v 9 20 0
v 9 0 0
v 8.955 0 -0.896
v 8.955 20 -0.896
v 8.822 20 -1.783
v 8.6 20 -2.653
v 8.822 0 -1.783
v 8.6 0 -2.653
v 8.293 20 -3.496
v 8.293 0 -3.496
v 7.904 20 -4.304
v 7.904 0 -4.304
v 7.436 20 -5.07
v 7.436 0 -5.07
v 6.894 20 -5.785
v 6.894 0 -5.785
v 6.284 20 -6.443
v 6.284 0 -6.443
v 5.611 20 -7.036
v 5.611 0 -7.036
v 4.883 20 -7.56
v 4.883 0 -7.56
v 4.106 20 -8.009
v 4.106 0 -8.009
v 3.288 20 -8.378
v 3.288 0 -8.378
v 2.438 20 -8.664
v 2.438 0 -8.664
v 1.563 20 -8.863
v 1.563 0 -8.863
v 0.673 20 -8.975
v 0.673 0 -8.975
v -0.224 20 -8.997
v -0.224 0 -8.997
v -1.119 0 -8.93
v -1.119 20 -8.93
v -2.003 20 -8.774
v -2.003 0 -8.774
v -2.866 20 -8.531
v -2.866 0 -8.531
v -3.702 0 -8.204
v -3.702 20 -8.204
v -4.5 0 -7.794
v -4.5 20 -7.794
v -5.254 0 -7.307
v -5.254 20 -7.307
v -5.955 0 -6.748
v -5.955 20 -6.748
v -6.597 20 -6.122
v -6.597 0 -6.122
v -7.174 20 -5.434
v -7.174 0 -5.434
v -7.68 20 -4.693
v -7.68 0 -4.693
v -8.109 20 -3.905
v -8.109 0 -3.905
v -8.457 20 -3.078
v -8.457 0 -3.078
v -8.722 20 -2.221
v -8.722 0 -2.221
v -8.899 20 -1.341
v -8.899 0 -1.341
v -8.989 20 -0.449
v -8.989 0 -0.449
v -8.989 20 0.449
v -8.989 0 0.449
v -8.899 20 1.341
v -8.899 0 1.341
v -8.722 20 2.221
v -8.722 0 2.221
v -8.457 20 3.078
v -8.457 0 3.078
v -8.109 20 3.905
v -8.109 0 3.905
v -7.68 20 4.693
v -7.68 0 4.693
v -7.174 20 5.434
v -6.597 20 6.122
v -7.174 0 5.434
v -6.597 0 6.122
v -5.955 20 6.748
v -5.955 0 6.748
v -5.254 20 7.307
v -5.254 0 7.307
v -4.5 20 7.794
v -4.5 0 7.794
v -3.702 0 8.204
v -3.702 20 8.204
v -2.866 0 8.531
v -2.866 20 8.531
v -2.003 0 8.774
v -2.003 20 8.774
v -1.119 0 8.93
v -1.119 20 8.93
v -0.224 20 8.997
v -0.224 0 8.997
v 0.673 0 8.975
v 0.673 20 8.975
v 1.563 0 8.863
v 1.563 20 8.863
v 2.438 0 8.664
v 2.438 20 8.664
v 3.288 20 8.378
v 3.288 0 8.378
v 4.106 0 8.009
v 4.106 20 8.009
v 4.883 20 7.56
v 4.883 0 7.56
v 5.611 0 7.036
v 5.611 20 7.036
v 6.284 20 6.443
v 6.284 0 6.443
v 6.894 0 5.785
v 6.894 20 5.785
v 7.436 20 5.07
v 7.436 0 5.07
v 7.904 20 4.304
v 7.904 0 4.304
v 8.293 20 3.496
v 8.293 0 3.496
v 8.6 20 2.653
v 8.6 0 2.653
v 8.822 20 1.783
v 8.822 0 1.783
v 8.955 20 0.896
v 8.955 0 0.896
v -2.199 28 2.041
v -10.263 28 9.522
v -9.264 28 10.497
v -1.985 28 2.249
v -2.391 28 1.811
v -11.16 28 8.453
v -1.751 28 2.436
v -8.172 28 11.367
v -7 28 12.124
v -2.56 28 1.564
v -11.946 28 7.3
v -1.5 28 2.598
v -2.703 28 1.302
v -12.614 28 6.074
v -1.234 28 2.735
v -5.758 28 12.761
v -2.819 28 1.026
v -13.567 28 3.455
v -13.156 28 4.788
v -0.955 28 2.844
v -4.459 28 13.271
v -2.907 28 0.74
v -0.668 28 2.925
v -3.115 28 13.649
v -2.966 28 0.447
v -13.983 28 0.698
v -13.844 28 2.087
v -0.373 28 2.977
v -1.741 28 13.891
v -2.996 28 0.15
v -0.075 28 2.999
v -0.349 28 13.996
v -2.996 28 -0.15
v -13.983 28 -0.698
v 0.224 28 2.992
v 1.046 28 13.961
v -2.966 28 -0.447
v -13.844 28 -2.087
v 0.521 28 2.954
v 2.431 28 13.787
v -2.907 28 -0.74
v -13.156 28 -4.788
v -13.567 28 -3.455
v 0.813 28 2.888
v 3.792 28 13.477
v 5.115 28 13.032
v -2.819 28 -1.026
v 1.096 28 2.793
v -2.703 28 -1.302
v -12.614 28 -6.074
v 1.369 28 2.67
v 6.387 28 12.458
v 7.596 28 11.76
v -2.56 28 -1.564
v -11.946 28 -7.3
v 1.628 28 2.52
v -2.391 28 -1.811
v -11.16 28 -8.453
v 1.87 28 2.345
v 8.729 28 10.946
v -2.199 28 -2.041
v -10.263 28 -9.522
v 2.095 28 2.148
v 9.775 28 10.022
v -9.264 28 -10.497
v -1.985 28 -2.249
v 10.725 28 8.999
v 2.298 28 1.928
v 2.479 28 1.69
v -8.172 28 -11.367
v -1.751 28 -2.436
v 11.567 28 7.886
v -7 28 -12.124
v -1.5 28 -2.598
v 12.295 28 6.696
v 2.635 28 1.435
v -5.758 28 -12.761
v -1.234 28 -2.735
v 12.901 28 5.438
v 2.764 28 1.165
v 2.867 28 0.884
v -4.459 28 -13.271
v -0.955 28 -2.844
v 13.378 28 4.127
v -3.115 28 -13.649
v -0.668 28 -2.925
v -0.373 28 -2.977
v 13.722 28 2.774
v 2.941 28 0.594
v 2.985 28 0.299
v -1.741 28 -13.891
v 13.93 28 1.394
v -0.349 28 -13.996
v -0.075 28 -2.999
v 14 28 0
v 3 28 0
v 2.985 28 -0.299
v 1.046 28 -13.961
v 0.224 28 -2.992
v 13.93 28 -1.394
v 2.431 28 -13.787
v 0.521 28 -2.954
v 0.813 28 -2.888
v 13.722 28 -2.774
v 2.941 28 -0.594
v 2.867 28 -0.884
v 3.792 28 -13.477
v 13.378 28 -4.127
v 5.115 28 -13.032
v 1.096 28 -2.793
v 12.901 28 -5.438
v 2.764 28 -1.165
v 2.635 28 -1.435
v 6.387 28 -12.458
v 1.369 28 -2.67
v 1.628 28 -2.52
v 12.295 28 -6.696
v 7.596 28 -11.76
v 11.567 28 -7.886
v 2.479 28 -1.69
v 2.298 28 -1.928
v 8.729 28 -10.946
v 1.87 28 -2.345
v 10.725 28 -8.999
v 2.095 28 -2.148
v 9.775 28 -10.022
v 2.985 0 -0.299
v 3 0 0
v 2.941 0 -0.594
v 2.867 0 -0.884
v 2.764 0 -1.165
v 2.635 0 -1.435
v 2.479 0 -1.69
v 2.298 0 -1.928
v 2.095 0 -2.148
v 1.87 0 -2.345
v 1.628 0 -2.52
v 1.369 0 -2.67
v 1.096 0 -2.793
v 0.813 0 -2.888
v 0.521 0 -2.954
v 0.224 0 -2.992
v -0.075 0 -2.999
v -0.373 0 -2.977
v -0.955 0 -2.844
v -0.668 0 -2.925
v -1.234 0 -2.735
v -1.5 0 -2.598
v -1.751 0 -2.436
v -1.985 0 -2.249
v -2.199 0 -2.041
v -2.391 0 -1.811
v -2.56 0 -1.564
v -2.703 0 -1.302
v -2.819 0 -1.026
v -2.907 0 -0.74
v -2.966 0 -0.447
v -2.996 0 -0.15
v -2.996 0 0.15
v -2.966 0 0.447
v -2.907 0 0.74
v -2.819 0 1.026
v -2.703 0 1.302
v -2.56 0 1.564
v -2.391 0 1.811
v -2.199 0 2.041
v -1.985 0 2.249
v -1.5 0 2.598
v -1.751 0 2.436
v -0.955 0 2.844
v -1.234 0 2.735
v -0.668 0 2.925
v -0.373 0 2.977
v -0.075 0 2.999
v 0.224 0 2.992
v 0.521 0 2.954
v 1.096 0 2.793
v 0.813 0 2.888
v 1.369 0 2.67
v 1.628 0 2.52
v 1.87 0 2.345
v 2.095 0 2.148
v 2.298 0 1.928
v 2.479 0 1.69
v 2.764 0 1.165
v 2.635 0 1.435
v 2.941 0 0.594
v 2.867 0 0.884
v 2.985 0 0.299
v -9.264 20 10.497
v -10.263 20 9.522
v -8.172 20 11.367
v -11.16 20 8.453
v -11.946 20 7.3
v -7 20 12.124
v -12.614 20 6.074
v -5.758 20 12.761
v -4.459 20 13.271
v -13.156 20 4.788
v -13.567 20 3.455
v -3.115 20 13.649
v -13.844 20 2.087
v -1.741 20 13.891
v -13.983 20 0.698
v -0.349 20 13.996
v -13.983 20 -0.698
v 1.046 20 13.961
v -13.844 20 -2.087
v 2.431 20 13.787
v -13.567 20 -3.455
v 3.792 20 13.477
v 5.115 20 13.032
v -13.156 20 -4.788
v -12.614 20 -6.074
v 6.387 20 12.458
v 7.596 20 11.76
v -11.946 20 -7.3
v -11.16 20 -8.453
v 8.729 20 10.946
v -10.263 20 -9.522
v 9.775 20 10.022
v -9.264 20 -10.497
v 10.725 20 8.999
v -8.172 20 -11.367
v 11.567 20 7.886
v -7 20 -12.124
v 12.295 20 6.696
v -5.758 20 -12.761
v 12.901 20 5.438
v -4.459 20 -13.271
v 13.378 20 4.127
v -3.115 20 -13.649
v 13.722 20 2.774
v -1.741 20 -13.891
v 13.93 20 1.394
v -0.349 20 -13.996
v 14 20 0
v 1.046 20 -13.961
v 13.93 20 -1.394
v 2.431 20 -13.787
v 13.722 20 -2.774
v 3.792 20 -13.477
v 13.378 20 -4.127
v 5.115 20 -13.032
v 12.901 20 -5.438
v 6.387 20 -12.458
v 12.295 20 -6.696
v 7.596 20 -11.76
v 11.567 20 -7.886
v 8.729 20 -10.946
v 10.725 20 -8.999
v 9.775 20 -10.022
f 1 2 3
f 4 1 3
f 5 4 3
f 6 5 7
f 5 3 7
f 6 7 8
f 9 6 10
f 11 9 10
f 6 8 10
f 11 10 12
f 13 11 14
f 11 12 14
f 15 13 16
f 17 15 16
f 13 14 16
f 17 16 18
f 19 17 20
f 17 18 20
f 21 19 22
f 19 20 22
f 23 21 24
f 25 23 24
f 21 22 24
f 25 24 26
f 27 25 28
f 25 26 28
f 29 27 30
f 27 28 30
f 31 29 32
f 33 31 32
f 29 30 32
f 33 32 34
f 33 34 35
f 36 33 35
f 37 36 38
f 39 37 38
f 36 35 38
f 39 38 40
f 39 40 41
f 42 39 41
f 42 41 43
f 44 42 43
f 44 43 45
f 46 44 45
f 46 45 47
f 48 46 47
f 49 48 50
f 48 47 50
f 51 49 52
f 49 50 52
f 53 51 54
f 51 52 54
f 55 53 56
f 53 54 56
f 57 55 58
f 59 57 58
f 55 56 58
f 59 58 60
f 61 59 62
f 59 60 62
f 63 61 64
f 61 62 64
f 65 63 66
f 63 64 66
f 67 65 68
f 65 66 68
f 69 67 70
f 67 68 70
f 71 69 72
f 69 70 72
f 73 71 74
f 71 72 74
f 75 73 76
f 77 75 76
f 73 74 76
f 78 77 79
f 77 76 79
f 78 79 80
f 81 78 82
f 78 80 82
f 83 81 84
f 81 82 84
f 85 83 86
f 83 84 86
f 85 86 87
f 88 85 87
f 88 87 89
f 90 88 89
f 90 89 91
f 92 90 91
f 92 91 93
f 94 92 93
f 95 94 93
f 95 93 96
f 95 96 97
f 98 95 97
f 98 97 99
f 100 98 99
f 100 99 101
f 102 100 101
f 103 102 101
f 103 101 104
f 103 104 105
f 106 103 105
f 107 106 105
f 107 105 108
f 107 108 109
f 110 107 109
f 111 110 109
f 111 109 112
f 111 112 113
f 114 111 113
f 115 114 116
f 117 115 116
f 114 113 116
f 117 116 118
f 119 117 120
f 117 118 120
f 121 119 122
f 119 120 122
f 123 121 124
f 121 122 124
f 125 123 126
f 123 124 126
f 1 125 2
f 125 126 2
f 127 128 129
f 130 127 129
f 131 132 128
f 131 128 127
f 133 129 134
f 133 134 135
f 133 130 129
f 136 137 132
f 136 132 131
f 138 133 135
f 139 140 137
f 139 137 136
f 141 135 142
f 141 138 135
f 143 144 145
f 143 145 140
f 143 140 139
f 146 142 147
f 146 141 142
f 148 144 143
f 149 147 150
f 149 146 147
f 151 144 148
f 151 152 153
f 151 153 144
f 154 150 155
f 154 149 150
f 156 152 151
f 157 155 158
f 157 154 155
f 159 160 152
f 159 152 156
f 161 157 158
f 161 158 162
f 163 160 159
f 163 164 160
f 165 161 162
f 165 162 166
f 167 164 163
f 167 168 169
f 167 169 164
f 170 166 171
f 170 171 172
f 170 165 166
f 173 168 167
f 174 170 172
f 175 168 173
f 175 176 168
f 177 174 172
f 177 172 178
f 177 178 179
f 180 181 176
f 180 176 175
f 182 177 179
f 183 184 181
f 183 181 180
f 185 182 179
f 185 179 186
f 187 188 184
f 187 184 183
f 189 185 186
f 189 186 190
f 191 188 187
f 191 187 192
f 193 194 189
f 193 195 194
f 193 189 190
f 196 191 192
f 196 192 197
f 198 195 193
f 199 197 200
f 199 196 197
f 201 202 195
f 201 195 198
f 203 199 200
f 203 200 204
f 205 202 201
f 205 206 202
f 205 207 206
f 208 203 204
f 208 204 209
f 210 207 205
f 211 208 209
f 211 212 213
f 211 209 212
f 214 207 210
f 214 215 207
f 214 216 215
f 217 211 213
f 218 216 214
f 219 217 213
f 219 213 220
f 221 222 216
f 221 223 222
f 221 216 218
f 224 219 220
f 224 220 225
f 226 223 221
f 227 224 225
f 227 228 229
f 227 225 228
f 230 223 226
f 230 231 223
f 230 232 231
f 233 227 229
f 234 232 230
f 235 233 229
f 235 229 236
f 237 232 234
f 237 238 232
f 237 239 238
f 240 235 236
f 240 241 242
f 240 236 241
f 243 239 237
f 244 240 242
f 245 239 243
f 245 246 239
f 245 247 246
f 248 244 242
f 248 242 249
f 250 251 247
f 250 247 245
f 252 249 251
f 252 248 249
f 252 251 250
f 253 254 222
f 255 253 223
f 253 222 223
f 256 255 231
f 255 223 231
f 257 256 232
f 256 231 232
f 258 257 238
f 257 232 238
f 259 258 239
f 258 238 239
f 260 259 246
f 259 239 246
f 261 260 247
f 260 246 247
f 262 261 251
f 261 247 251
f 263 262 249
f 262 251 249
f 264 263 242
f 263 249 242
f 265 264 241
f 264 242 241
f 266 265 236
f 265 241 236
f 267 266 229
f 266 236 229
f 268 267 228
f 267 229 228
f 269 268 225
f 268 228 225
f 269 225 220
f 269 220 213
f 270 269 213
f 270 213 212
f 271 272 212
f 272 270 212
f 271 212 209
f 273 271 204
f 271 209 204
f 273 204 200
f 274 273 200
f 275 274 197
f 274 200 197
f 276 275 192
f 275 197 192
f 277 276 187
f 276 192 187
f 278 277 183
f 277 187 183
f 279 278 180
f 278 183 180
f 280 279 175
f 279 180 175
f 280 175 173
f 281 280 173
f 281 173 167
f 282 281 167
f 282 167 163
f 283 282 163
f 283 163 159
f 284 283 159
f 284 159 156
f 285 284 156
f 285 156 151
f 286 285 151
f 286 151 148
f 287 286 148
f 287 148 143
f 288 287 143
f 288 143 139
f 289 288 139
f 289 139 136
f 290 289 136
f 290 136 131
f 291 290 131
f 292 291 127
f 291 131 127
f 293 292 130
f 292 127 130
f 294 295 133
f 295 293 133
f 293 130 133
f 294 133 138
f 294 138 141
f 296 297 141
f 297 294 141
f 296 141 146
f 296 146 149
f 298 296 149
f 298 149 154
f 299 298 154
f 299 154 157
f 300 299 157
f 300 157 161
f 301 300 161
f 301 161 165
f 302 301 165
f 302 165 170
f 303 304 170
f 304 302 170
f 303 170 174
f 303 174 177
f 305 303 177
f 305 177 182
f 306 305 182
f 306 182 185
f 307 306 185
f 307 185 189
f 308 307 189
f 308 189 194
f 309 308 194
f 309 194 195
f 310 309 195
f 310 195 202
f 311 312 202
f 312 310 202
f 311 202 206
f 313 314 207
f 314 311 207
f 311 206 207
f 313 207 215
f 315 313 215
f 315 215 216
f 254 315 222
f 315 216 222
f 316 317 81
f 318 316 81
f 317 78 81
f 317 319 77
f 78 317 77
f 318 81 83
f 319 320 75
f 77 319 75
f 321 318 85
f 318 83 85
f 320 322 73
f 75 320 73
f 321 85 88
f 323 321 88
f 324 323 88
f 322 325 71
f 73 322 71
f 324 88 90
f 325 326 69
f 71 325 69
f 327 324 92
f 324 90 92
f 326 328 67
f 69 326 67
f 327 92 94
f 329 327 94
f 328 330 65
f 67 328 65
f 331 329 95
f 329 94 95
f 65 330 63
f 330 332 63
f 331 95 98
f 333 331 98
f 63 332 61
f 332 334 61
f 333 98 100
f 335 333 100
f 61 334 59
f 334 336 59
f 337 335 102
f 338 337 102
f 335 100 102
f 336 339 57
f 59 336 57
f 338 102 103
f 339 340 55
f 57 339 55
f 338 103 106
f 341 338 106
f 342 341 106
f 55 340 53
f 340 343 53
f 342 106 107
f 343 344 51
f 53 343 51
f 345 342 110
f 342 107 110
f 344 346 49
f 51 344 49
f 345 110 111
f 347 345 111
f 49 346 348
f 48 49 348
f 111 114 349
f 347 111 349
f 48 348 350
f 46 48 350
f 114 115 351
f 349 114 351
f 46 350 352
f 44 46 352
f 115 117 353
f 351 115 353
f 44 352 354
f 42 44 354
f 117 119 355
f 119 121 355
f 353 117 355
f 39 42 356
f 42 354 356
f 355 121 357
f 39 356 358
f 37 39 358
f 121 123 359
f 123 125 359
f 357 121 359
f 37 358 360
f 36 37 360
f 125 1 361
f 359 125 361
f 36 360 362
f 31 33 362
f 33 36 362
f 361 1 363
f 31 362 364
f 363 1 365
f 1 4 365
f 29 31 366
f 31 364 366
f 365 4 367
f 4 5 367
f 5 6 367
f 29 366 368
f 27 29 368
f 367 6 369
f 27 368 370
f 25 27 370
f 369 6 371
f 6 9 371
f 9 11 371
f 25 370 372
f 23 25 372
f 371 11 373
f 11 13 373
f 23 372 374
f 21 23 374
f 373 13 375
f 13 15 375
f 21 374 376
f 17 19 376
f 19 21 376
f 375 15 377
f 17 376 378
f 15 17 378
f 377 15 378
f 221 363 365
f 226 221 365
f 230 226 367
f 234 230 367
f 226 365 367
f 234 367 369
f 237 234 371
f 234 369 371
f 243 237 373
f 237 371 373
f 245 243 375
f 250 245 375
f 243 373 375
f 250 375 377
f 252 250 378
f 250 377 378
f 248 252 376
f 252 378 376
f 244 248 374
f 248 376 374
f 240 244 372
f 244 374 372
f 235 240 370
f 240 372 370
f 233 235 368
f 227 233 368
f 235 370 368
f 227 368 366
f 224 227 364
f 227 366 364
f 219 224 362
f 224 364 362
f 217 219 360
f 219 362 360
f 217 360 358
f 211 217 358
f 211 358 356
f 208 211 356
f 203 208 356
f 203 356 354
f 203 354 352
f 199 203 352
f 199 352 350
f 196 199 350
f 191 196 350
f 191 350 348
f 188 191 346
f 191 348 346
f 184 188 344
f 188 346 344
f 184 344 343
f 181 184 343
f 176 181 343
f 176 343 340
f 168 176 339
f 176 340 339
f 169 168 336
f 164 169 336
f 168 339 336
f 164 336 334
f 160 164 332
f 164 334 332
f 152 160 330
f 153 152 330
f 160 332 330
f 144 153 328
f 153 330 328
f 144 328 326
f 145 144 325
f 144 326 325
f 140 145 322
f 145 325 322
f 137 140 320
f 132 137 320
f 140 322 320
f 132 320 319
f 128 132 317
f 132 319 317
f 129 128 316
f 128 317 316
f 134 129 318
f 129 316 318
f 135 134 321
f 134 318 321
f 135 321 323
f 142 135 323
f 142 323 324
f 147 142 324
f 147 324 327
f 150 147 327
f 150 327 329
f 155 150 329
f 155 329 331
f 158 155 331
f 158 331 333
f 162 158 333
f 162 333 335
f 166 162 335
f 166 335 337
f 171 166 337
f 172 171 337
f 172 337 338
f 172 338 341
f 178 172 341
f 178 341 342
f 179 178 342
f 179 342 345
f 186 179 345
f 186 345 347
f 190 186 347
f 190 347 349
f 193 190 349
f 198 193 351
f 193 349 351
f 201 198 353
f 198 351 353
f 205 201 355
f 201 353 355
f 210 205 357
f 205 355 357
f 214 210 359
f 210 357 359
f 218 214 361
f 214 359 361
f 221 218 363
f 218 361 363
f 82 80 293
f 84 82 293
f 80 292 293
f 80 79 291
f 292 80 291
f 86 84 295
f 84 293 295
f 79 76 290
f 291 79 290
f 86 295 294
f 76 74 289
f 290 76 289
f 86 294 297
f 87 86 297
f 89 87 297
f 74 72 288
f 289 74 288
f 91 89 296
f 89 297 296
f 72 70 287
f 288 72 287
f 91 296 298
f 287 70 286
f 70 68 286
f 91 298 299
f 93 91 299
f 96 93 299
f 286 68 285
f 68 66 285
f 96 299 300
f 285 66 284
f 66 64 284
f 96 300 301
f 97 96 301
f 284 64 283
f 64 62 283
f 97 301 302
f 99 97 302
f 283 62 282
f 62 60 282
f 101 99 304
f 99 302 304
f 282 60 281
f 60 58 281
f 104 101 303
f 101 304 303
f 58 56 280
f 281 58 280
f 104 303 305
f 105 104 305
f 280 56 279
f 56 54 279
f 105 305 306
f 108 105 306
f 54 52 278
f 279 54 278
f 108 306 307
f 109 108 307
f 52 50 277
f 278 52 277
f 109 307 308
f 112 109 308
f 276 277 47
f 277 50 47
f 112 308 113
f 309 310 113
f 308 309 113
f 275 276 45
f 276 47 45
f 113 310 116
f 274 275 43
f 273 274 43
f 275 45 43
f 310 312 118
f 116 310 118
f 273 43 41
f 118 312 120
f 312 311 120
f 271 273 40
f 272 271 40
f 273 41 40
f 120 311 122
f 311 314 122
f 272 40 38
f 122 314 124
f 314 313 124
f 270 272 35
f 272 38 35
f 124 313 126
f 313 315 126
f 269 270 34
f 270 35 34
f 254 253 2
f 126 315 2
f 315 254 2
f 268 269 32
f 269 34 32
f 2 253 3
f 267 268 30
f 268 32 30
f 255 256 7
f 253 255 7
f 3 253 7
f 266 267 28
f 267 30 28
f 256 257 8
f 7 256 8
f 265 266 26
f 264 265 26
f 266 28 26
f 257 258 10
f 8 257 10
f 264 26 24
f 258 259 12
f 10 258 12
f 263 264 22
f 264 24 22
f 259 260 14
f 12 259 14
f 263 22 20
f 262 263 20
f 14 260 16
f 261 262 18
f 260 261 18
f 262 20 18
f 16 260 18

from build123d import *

# Parameters (mm, degrees)
SKETCH1_R           = 9
BOSS_EXTRUDE1_DEPTH = 20
SKETCH2_R           = 3
CUT_EXTRUDE1_DEPTH  = 52
SKETCH3_R           = 14
BOSS_EXTRUDE2_DEPTH = 8
SKETCH4_R           = 3
CUT_EXTRUDE2_DEPTH  = 12


with BuildPart() as part:
    # Sketch1 → Boss-Extrude1 (new body)
    with BuildSketch(Plane(origin=(0, 0, 0), x_dir=(1, 0, 0), z_dir=(0, 1, 0))):
        Circle(SKETCH1_R)
    extrude(amount=BOSS_EXTRUDE1_DEPTH)

    # Sketch2 → Cut-Extrude1 (cut)
    with BuildSketch(Plane.XZ):
        Circle(SKETCH2_R)
    extrude(amount=-CUT_EXTRUDE1_DEPTH, mode=Mode.SUBTRACT)

    # Sketch3 → Boss-Extrude2 (add)
    with BuildSketch(Plane(origin=(0, 20, 0), x_dir=(1, 0, 0), z_dir=(0, 1, 0))):
        Circle(SKETCH3_R)
    extrude(amount=BOSS_EXTRUDE2_DEPTH)

    # Sketch4 → Cut-Extrude2 (cut)
    with BuildSketch(Plane(origin=(0, 28, 0), x_dir=(1, 0, 0), z_dir=(0, 1, 0))):
        Circle(SKETCH4_R)
    extrude(amount=-CUT_EXTRUDE2_DEPTH, mode=Mode.SUBTRACT)


solid = part.part
